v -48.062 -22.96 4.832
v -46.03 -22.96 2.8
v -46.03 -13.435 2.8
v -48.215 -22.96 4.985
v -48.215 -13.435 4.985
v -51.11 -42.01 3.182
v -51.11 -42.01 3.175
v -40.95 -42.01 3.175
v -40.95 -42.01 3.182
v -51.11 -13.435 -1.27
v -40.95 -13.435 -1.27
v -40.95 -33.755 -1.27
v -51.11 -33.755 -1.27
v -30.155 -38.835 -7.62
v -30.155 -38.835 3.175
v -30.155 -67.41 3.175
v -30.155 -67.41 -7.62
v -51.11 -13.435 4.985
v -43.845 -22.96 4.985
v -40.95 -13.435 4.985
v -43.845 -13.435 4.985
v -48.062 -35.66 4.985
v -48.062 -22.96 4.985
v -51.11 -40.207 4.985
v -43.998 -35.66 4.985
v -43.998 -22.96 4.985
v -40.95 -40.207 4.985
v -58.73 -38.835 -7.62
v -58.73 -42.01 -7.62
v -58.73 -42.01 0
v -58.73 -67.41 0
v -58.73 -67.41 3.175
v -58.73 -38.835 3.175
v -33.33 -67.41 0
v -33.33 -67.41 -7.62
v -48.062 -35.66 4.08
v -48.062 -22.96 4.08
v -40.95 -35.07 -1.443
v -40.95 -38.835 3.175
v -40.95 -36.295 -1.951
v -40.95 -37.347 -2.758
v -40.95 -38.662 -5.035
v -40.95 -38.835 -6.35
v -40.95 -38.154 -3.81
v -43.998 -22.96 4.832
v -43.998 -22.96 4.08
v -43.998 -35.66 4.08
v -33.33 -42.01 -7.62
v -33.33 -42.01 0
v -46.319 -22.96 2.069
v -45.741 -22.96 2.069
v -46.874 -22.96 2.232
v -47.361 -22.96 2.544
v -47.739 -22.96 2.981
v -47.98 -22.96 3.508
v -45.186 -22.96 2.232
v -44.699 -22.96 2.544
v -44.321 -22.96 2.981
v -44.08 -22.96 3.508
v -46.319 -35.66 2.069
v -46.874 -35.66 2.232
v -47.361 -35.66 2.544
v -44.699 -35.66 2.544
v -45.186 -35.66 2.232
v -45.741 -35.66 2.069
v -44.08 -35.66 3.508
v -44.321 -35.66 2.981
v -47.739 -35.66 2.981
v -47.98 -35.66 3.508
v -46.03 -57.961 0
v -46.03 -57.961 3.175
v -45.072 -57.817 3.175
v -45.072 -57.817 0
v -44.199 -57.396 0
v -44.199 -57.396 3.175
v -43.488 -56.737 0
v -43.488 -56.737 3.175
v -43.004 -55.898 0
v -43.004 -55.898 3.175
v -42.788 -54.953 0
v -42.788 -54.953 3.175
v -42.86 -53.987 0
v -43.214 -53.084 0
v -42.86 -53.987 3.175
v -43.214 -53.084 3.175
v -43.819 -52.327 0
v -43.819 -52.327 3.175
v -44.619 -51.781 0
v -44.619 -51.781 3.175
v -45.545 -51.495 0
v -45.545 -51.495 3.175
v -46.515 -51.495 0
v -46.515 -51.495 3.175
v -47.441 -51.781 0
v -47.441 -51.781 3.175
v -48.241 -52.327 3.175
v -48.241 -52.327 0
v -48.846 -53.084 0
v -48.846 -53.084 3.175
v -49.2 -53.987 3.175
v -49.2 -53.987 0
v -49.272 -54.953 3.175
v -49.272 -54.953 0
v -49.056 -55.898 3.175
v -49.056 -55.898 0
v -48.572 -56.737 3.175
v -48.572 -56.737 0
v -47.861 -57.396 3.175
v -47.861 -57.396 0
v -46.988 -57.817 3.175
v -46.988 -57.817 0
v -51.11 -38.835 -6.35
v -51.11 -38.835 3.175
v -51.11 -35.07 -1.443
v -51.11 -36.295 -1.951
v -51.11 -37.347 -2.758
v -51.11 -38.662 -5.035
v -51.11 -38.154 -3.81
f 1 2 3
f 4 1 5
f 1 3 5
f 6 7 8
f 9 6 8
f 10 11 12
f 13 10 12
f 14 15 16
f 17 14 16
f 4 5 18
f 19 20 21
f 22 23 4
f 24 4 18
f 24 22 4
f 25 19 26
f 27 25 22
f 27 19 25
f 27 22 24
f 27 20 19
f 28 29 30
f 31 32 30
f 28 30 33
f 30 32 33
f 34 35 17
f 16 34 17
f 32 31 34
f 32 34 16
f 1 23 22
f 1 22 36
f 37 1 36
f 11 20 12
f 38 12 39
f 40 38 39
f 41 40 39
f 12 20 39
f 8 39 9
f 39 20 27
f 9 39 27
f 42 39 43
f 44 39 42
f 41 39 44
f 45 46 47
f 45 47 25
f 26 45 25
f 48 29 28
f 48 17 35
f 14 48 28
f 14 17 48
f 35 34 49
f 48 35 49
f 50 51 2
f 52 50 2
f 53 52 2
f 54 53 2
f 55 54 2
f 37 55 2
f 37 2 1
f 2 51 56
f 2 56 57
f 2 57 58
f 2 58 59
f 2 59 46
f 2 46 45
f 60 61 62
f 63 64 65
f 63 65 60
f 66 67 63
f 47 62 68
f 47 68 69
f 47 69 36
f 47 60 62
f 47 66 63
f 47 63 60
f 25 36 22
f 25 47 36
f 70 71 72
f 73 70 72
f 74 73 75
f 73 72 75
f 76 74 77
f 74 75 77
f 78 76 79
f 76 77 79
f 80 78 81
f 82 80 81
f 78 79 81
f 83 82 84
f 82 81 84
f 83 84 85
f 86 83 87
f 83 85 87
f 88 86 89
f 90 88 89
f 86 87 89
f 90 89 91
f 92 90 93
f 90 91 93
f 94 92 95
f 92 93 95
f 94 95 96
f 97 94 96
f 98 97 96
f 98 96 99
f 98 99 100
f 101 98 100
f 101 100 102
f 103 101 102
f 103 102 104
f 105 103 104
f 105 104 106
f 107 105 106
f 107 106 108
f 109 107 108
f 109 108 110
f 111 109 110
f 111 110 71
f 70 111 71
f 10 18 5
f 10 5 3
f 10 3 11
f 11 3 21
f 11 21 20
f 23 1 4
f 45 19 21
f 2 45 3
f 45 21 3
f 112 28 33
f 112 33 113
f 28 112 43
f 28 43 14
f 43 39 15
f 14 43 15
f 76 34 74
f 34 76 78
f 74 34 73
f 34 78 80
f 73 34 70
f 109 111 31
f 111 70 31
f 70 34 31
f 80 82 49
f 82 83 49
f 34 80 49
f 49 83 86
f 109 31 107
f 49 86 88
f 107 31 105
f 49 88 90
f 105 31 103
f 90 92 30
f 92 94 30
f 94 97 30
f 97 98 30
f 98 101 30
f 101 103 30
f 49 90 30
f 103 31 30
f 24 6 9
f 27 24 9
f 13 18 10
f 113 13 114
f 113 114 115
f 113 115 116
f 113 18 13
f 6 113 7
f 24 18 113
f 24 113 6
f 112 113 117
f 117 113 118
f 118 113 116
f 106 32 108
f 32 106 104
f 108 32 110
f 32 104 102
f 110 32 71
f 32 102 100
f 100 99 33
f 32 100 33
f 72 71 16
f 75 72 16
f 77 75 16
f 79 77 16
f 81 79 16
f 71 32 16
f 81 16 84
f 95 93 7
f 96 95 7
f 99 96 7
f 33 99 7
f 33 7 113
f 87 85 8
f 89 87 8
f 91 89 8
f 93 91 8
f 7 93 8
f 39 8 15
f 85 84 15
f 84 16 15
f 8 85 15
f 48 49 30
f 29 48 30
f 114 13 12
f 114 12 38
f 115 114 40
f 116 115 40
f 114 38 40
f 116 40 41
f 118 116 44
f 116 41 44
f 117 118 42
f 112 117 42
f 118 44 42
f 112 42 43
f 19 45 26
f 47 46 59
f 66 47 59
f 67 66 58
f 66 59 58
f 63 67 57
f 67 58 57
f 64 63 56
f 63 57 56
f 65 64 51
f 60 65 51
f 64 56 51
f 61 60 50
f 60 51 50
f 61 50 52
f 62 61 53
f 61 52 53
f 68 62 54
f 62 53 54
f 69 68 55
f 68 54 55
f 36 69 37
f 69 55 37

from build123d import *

# Parameters (mm, degrees)
SKETCH020_W             = 25.4
SKETCH020_H             = 3.175
PAD005_DEPTH            = 25.4
SKETCH001_W             = 28.575
SKETCH001_H             = 10.16
PAD006_DEPTH            = 1.81
PAD006_DEPTH_BACK       = 4.445
POCKET004_DEPTH         = 9.525
POCKET005_DEPTH         = 12.7
CHAMFER_SIZE            = 1.8034
SKETCH023_R             = 3.2512
POCKET006_DEPTH         = 4.446
PAD007_DEPTH            = 10.795
FILLET_R                = 5.08
BODY003_ROLL_ANGLE      = 90
BODY003_PLACEMENT_ANGLE = 90


with BuildPart() as part:
    # Sketch020 → Pad005 (new body)
    with BuildSketch(Plane.XY):
        with Locations((-12.7, 1.5875)):
            Rectangle(SKETCH020_W, SKETCH020_H)
    extrude(amount=PAD005_DEPTH)

    # Sketch001 (on Face1 of Pad005) → Pad006 (join, two sides)
    with BuildSketch(Plane(origin=(0, 3.175, 0), x_dir=(-1, 0, 0), z_dir=(0, 1, 0))) as pad006_sk:
        with Locations((-14.2875, 12.7)):
            Rectangle(SKETCH001_W, SKETCH001_H)
    extrude(amount=PAD006_DEPTH)
    extrude(pad006_sk.sketch, amount=-PAD006_DEPTH_BACK)

    # Sketch021 (on Face13 of Pad006) → Pocket004 (cut)
    with BuildSketch(Plane.YZ.offset(28.575)):
        Polygon((9.150137, 19.05), (2.800137, 12.7), (9.150137, 6.35), align=None)
    extrude(amount=-POCKET004_DEPTH, mode=Mode.SUBTRACT)

    # Sketch022 (on Face16 of Pocket004) → Pocket005 (cut)
    with BuildSketch(Plane.YZ.offset(19.05)):
        with BuildLine():
            ThreePointArc((4.08, 14.732), (2.048, 12.7), (4.08, 10.668))
            Line((4.985, 10.668), (4.08, 10.668))
            Line((4.985, 14.732), (4.985, 10.668))
            Line((4.08, 14.732), (4.985, 14.732))
        make_face()
    extrude(amount=-POCKET005_DEPTH, mode=Mode.SUBTRACT)

    # Chamfer
    chamfer_edges = [part.edges().sort_by_distance(p)[0] for p in [
        (0, 4.985, 12.7),
    ]]
    chamfer(chamfer_edges, length=CHAMFER_SIZE)

    # Sketch023 (on Face4 of Chamfer) → Pocket006 (cut, through all)
    with BuildSketch(Plane(origin=(0, 3.175, 0), x_dir=(-1, 0, 0), z_dir=(0, 1, 0))):
        with Locations((12.7, 12.7)):
            Circle(SKETCH023_R)
    extrude(amount=-POCKET006_DEPTH, mode=Mode.SUBTRACT)

    # Sketch024 (on Face4 of Pocket006) → Pad007 (join)
    with BuildSketch(Plane(origin=(0, 3.175, 0), x_dir=(-1, 0, 0), z_dir=(0, 1, 0))):
        Polygon((0, 0), (-3.175, 0), (-3.175, 28.575), (25.4, 28.575), (25.4, 25.4), (0, 25.4), align=None)
    extrude(amount=-PAD007_DEPTH)

    # Fillet
    fillet_edges = [part.edges().sort_by_distance(p)[0] for p in [
        (3.175, -1.27, 12.7),
    ]]
    fillet(fillet_edges, radius=FILLET_R)


with BuildPart() as part_1:
    # Body003 roll: moved
    add(part.part.rotate(Axis((0, 0, 0), (1, 0, 0)), BODY003_ROLL_ANGLE))


with BuildPart() as part_2:
    # Body003 placement: moved
    add(part_1.part.moved(Location((-58.73, -42.01, 0))).rotate(Axis((-58.73, -42.01, 0), (0, 0, 1)), BODY003_PLACEMENT_ANGLE))


solid = part_2.part
